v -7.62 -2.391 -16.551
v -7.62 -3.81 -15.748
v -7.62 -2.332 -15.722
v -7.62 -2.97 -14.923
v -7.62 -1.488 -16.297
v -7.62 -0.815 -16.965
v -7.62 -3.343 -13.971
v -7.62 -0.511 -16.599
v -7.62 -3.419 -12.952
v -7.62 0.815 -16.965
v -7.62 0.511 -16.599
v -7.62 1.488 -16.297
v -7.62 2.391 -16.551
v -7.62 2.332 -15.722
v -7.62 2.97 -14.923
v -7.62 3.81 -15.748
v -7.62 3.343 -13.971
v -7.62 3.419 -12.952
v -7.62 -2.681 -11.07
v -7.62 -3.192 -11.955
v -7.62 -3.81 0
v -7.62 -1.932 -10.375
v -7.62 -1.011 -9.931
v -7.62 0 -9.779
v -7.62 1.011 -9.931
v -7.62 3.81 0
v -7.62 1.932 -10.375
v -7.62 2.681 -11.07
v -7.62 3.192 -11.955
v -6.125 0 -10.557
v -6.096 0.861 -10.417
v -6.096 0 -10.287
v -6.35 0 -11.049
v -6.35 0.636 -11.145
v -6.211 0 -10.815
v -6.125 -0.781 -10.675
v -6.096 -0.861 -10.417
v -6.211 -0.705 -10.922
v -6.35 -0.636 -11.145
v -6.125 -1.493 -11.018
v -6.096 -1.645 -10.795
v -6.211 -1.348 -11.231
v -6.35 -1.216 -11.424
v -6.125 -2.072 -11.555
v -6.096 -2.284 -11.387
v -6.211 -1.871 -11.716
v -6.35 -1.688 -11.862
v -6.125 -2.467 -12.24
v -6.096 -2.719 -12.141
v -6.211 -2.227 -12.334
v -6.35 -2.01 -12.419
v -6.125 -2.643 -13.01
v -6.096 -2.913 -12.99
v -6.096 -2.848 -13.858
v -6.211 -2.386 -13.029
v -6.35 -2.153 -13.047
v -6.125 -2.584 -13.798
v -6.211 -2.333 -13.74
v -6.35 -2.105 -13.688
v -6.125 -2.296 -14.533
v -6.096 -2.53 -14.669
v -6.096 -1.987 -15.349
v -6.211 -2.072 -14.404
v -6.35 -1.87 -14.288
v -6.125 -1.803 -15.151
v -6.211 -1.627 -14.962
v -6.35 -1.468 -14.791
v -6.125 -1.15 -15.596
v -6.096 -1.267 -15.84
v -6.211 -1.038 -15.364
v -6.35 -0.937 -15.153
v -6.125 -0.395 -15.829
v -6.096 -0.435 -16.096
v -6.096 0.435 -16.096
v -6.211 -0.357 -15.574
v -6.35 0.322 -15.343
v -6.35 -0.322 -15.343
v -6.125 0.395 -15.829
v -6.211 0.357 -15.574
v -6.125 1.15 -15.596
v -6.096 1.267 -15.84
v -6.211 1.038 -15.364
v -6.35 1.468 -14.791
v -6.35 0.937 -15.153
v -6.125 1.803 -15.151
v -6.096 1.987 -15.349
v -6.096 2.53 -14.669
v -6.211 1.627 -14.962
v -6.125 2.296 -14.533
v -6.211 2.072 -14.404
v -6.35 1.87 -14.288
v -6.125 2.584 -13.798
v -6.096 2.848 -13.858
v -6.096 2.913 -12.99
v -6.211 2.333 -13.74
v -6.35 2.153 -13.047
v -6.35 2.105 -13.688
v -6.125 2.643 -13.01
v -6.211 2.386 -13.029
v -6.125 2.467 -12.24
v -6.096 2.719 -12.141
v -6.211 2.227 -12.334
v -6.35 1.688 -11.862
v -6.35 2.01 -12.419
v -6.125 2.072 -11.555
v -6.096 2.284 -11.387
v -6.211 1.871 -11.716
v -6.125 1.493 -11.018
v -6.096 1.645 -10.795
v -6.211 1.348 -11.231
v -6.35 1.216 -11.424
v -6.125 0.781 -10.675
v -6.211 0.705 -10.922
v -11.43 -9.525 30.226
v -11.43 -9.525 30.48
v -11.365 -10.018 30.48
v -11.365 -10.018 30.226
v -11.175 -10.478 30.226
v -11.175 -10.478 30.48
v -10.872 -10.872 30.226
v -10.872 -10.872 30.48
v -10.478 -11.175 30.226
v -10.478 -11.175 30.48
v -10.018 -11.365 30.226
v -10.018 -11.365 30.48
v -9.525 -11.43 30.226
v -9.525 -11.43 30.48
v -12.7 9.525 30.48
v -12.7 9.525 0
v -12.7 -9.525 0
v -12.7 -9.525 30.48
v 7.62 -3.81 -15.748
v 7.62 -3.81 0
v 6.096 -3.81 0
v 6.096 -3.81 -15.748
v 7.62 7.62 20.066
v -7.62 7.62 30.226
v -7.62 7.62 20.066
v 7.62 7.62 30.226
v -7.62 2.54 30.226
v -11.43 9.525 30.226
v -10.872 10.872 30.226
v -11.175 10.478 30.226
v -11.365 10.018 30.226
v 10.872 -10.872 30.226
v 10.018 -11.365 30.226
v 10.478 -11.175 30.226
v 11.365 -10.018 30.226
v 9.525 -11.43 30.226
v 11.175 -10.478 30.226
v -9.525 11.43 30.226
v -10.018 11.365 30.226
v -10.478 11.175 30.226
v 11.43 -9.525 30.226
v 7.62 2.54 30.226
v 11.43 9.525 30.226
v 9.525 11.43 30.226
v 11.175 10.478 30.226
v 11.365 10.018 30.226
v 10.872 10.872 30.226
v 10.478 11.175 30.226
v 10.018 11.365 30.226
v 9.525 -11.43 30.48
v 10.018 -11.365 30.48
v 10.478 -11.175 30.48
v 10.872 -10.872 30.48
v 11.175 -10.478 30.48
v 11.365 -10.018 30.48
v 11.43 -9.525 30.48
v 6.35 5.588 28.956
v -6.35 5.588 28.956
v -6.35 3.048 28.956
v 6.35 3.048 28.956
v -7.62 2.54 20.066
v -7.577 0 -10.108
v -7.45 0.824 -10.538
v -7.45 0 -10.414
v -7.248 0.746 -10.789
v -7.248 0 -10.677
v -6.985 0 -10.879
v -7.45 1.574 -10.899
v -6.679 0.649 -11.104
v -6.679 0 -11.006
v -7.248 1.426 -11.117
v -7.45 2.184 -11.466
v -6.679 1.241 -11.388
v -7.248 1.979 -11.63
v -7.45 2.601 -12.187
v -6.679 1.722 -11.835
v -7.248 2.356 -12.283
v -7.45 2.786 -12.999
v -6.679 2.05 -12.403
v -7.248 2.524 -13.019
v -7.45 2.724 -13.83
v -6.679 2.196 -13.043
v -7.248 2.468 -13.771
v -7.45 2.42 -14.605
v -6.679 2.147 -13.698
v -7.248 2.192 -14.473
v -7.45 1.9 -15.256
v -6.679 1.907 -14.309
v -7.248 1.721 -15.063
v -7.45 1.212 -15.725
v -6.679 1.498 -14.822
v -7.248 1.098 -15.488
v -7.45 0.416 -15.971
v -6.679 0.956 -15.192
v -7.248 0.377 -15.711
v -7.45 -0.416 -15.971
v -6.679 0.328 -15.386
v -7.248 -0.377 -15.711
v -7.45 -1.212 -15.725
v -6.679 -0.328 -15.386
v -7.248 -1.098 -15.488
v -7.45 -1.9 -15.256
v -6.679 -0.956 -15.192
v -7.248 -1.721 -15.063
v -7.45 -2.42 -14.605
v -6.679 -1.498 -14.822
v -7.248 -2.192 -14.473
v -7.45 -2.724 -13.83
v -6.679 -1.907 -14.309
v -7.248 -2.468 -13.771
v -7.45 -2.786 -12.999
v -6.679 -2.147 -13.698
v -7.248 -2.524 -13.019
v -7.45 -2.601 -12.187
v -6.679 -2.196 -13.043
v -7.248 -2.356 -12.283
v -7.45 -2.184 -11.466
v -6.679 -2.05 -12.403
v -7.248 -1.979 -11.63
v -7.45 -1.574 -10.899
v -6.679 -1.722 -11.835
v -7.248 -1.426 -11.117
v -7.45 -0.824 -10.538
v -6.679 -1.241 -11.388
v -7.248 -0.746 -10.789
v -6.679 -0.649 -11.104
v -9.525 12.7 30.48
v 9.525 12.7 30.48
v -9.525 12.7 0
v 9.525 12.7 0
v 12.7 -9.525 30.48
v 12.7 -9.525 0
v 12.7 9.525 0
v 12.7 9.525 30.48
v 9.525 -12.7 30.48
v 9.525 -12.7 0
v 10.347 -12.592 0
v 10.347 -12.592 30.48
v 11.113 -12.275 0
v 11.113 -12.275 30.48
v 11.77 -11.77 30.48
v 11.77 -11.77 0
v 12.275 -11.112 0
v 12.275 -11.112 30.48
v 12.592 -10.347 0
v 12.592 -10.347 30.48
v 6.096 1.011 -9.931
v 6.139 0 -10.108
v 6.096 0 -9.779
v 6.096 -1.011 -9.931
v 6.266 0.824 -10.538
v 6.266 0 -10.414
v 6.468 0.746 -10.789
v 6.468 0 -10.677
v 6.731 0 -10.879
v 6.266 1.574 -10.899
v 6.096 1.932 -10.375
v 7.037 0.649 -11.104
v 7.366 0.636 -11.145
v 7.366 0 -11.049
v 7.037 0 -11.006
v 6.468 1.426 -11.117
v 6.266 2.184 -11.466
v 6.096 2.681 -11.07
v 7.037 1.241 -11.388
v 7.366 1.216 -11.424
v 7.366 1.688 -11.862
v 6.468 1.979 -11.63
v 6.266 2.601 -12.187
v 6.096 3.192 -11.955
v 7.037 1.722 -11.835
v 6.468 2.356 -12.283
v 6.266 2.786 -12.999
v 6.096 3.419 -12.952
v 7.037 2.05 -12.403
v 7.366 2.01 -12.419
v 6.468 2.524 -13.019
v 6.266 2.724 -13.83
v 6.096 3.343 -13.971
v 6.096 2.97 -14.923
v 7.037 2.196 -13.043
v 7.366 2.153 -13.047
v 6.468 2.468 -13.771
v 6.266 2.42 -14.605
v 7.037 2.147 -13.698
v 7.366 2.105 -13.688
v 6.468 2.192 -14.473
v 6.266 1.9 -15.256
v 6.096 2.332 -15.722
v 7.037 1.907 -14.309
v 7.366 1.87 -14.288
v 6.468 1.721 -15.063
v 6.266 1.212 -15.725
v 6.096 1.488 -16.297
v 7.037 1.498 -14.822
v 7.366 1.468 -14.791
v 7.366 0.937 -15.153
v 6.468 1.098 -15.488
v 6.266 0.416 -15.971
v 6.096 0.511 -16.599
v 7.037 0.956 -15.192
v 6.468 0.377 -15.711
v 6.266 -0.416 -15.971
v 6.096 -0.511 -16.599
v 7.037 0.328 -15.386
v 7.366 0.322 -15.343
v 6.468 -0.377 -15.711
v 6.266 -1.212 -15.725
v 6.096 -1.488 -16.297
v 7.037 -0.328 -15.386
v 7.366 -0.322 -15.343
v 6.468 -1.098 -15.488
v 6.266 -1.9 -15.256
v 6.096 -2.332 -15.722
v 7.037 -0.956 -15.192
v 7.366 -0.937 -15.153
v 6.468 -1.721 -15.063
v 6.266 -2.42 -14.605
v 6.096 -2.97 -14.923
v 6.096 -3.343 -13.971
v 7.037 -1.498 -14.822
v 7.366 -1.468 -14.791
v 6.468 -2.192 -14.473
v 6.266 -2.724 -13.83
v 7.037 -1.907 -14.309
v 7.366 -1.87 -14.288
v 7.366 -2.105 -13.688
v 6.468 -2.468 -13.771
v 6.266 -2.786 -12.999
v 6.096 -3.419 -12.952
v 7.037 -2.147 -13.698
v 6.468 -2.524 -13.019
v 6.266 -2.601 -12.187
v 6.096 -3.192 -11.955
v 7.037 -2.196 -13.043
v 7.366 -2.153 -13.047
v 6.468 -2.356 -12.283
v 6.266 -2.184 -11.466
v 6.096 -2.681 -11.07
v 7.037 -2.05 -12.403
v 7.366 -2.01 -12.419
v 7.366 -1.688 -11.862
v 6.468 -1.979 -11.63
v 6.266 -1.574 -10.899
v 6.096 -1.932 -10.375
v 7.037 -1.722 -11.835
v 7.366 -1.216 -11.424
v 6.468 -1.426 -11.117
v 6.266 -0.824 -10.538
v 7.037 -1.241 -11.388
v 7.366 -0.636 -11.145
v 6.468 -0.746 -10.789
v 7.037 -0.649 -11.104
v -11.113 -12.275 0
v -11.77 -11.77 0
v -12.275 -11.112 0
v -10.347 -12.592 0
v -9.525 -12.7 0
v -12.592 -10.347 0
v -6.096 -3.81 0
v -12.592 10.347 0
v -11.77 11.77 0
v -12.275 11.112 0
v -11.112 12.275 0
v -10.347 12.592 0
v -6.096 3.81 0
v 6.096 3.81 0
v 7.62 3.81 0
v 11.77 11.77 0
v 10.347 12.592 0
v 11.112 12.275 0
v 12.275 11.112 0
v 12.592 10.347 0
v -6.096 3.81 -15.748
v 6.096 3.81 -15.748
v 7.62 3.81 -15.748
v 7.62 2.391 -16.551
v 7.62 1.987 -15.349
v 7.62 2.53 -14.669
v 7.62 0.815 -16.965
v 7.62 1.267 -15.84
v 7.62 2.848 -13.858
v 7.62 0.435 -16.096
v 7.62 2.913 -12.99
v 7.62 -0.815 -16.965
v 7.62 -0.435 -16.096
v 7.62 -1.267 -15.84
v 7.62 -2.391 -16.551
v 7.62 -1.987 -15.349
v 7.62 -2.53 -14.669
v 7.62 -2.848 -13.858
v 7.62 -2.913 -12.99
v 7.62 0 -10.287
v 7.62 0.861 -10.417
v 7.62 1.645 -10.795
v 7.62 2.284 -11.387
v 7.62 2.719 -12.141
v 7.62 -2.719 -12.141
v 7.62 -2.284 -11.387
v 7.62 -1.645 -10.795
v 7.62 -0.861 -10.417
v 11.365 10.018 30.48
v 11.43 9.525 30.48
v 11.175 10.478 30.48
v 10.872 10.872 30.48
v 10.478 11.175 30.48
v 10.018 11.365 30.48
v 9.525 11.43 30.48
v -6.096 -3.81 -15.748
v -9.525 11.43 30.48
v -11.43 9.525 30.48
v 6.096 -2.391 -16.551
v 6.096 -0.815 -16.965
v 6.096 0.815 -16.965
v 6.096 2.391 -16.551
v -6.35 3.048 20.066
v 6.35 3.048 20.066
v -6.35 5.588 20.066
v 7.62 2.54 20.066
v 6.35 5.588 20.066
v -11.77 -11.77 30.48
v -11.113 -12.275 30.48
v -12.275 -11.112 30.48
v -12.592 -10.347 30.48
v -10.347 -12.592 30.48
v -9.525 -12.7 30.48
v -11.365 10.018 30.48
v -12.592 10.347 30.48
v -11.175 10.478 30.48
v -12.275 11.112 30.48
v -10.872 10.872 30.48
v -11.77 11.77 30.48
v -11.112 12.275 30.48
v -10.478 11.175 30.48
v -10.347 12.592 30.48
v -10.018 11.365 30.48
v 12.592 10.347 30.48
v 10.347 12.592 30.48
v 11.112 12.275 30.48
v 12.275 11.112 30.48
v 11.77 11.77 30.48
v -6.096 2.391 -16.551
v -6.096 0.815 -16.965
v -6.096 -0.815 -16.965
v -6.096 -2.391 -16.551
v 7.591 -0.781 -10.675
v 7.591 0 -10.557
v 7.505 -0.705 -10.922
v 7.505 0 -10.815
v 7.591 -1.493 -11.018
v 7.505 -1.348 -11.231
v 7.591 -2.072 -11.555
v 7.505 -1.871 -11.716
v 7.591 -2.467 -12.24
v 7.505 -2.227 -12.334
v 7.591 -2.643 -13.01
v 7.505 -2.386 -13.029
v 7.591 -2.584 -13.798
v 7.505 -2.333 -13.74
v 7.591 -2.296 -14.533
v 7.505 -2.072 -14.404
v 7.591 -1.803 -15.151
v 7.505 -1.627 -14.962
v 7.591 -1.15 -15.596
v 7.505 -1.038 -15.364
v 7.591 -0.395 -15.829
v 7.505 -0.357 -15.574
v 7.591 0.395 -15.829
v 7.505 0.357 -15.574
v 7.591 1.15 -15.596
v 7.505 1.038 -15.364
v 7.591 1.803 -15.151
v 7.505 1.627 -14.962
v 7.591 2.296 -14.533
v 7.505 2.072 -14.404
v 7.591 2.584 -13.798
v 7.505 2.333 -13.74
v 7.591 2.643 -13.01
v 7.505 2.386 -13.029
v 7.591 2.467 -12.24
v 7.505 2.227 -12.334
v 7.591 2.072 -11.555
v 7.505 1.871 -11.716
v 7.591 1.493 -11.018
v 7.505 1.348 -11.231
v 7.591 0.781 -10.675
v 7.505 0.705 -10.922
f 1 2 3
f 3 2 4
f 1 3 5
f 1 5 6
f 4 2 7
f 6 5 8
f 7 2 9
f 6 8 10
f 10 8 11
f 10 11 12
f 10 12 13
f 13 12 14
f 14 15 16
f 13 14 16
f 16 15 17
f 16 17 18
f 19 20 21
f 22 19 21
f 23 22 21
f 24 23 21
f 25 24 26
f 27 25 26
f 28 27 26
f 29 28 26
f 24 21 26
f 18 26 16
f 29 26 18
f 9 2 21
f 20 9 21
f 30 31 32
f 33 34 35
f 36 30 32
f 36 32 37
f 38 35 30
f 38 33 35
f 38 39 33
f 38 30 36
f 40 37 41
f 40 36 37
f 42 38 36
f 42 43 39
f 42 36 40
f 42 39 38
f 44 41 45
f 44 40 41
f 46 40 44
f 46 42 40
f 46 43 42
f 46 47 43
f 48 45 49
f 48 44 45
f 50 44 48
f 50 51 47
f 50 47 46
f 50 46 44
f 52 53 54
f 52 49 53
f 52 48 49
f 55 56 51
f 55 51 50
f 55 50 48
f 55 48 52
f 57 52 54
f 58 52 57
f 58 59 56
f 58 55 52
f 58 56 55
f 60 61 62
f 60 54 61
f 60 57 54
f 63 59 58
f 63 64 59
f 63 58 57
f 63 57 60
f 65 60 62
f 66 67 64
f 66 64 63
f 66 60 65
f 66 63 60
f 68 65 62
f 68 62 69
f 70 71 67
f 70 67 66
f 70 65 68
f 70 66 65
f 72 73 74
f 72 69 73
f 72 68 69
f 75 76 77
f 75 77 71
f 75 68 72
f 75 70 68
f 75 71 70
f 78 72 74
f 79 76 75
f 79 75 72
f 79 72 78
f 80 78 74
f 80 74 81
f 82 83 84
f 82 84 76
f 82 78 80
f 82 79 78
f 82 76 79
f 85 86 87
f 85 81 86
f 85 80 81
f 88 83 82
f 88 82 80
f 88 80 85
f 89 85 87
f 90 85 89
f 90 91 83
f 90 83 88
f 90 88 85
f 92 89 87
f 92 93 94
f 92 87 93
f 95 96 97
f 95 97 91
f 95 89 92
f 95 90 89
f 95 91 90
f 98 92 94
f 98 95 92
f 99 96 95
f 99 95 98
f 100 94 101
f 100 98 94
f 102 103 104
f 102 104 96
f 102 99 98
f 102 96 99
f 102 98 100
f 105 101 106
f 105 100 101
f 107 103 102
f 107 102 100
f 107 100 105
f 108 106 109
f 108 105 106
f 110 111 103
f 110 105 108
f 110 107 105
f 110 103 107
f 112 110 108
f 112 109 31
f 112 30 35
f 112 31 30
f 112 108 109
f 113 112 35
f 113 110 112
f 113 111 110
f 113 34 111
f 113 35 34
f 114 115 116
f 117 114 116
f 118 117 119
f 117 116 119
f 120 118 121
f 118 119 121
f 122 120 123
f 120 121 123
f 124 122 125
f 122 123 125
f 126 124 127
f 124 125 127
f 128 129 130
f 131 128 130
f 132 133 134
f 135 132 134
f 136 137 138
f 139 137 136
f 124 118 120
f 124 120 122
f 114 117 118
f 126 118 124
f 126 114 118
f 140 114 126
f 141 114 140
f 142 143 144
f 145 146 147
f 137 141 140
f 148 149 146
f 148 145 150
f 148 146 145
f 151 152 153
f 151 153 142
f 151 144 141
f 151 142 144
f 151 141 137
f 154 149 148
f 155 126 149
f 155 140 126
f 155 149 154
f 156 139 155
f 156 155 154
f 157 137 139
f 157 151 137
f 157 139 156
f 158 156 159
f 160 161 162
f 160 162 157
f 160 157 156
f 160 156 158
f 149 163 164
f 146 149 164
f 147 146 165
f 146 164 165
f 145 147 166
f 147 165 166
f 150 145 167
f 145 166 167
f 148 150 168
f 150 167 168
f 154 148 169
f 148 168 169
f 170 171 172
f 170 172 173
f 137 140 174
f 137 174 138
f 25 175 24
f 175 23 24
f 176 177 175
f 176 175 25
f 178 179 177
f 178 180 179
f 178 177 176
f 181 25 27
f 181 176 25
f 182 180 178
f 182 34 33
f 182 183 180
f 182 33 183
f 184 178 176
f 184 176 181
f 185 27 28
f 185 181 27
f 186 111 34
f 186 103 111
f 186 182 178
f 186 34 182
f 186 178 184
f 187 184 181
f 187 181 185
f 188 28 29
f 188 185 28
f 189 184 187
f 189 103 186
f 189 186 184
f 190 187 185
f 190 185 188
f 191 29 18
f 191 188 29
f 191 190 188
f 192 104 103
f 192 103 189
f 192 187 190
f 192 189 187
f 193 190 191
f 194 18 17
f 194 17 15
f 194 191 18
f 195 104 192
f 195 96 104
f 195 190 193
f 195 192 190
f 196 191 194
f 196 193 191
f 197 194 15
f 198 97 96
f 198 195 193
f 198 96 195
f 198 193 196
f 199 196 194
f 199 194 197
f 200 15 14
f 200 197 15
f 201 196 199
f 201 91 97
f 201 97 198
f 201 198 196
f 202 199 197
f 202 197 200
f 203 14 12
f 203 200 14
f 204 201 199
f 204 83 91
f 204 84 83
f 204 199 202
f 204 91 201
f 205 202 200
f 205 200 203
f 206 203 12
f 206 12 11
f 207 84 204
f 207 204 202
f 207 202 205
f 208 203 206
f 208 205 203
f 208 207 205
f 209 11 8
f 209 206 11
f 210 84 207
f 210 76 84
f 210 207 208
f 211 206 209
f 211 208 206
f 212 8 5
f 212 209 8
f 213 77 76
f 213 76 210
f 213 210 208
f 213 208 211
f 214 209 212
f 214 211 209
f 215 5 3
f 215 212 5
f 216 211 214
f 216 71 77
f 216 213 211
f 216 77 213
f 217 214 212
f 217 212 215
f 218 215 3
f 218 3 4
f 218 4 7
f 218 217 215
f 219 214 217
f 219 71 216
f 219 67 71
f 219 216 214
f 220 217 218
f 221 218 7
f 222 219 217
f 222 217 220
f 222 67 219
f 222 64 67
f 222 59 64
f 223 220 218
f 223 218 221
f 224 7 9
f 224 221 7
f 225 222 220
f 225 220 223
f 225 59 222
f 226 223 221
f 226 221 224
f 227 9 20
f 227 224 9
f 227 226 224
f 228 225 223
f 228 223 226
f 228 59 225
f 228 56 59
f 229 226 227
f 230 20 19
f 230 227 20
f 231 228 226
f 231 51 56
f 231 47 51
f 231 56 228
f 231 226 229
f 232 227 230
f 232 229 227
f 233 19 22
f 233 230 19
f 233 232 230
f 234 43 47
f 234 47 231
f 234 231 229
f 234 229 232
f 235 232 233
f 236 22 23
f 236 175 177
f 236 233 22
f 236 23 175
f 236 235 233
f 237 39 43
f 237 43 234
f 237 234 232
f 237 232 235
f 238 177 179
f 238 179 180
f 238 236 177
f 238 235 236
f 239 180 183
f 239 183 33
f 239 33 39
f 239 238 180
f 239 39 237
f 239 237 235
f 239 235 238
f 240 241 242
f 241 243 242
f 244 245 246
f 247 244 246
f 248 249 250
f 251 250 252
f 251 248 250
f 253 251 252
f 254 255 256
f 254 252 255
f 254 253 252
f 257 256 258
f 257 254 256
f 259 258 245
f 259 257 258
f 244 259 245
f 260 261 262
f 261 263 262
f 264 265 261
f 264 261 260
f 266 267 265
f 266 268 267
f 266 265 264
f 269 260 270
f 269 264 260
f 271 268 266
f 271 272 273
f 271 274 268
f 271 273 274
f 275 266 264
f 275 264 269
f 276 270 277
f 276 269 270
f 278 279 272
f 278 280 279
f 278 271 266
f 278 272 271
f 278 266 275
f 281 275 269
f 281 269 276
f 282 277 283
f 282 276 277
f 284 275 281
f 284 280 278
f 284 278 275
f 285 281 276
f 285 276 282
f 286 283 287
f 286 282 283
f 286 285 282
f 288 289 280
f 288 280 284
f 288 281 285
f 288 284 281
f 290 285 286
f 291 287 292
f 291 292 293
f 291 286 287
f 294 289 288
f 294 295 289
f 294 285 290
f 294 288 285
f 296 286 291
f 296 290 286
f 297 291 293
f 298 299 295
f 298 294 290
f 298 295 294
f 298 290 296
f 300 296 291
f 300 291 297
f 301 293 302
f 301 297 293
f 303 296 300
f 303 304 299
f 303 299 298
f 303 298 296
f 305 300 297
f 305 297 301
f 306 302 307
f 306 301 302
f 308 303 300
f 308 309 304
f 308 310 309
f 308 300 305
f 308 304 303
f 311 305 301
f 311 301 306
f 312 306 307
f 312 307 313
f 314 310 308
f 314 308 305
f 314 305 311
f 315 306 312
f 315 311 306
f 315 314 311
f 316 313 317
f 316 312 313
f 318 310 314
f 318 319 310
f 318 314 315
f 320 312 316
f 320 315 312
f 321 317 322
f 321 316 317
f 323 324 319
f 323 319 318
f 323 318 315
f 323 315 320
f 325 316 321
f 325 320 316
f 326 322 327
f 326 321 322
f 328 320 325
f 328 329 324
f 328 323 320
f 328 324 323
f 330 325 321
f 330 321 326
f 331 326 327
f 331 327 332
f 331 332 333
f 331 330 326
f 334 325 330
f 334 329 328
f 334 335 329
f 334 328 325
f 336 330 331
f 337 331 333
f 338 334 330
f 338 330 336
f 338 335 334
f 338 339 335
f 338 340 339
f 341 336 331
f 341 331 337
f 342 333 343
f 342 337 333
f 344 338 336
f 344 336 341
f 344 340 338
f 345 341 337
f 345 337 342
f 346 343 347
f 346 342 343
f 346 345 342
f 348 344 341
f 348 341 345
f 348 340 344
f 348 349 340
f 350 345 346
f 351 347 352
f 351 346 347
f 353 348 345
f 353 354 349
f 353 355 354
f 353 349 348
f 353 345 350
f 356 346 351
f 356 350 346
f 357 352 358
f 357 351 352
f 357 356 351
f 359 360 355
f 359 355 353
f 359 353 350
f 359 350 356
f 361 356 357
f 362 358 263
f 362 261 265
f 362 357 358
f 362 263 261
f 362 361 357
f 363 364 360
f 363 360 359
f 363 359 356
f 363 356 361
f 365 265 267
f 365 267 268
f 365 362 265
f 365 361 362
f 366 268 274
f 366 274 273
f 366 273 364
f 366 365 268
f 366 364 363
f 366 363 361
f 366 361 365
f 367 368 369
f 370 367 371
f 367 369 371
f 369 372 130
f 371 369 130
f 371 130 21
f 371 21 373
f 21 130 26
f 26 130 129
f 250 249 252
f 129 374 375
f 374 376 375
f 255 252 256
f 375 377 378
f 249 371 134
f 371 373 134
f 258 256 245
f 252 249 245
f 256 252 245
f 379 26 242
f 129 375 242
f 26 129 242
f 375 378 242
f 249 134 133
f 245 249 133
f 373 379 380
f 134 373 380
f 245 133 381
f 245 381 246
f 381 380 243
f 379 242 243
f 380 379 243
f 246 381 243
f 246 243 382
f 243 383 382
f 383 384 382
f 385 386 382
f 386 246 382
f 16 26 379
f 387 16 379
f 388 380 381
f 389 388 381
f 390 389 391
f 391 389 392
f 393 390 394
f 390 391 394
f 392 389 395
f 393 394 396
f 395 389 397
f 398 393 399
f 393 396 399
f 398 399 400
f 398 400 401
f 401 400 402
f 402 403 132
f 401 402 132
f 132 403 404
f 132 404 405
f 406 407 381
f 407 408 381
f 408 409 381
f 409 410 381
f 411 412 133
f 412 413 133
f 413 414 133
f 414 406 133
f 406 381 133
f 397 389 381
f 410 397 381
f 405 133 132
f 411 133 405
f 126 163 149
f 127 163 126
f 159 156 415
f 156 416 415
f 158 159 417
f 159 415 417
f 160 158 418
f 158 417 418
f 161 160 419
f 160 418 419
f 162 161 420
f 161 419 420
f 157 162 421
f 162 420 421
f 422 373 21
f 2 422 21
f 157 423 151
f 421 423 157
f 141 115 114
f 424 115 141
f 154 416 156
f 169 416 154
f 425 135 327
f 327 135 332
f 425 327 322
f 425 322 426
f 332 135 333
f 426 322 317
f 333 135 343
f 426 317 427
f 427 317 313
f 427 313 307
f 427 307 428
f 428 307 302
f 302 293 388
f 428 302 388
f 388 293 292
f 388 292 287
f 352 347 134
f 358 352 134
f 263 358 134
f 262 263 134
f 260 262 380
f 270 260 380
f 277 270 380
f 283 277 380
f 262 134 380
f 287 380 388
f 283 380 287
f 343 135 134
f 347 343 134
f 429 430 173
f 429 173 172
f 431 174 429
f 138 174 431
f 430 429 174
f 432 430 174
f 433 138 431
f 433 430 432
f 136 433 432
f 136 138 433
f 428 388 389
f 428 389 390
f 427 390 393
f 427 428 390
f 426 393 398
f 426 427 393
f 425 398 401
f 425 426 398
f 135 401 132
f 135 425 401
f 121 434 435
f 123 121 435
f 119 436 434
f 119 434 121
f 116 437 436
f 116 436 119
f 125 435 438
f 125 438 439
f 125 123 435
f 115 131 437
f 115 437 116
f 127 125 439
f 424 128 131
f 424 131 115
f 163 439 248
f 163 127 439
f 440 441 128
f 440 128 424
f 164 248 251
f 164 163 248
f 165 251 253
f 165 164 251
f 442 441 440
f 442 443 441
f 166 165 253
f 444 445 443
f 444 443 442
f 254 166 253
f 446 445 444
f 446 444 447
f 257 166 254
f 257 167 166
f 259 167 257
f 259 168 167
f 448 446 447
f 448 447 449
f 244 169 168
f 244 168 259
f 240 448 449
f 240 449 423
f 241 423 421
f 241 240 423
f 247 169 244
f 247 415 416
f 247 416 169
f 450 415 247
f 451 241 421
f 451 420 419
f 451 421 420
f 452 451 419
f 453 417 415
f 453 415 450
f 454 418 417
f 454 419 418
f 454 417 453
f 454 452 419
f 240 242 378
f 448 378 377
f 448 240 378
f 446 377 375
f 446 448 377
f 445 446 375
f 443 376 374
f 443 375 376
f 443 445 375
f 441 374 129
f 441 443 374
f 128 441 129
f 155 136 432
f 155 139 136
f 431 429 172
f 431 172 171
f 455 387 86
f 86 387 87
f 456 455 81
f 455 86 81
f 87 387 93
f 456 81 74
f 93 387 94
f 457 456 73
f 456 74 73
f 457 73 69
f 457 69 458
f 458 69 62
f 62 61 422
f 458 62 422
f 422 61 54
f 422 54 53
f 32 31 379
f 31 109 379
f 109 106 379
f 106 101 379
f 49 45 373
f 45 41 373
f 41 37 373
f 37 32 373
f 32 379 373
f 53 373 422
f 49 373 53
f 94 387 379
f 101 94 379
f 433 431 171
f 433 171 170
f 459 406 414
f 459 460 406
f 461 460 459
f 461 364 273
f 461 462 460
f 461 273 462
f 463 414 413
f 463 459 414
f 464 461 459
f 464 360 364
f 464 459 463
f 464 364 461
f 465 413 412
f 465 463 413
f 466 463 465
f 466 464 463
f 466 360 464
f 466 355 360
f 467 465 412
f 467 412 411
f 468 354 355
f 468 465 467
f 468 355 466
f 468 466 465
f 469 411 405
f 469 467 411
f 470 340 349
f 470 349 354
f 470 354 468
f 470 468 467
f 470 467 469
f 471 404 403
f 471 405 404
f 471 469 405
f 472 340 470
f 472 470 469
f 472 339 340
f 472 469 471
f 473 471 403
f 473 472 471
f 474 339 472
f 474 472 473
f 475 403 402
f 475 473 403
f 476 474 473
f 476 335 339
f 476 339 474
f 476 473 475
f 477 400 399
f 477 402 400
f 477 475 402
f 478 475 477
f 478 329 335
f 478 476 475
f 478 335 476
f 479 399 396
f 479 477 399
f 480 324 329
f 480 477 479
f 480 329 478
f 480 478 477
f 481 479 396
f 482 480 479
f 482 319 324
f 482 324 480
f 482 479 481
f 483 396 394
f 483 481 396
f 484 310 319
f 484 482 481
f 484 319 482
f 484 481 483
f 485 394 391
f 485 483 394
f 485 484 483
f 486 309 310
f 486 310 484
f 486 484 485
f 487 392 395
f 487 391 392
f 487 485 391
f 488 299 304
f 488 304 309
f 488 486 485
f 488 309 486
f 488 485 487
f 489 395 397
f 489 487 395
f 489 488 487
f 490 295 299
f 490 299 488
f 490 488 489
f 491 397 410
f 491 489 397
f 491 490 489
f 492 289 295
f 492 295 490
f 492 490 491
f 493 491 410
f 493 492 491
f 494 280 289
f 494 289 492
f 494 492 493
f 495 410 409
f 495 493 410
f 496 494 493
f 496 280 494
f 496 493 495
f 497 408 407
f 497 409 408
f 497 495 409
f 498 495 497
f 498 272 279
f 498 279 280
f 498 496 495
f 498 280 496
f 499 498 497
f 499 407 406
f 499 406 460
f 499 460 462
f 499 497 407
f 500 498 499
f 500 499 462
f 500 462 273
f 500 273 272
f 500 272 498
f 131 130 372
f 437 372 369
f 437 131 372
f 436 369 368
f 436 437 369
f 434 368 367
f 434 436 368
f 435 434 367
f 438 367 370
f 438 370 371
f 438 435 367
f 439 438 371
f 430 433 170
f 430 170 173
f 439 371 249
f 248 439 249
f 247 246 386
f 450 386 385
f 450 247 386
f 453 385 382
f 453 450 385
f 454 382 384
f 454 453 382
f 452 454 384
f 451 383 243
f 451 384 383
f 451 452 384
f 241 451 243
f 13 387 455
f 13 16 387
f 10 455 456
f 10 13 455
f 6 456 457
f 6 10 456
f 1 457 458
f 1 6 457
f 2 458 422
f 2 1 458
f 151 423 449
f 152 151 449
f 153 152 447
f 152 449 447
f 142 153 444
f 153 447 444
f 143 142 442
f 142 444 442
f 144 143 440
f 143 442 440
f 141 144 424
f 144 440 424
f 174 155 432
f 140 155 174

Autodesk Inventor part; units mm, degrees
ref_plane "YZ Plane" through (0, 0, 0) normal (1, 0, 0) x (0, 1, 0)
ref_plane "XZ Plane" through (0, 0, 0) normal (0, 1, 0) x (-1, 0, 0)
ref_plane "XY Plane" through (0, 0, 0) normal (0, 0, 1) x (1, 0, 0)
sketch "Sketch1" plane through (0, 0, 0) normal (0, 0, 1) x (1, 0, 0)
  line L0 (-12.7, -12.7) -> (12.7, -12.7)
  line L1 (12.7, -12.7) -> (12.7, 12.7)
  line L2 (12.7, 12.7) -> (-12.7, 12.7)
  line L3 (-12.7, 12.7) -> (-12.7, -12.7)
  line L4 (-12.7, -12.7) -> (12.7, 12.7) construction
  line L5 (12.7, -12.7) -> (-12.7, 12.7) construction
  point P0 (0, 0)
  dimension "d0" = 25.4
extrude "Extrusion1" add sketch "Sketch1" along normal blind 30.48
fillet "Fillet1" radius 3.175 4 edges at (-12.7, 12.7, 15.24) (-12.7, -12.7, 15.24) (12.7, -12.7, 15.24) (12.7, 12.7, 15.24)
sketch "Sketch2" plane through (0, 0, 30.48) normal (0, 0, 1) x (1, 0, 0)
  arc A0 (12.7, 9.525) -> (9.525, 12.7) centre (9.525, 9.525) ccw projected
  line L0 (9.525, 12.7) -> (-9.525, 12.7) projected
  arc A1 (-9.525, 12.7) -> (-12.7, 9.525) centre (-9.525, 9.525) ccw projected
  line L1 (-12.7, 9.525) -> (-12.7, -9.525) projected
  arc A2 (-12.7, -9.525) -> (-9.525, -12.7) centre (-9.525, -9.525) ccw projected
  line L2 (-9.525, -12.7) -> (9.525, -12.7) projected
  arc A3 (9.525, -12.7) -> (12.7, -9.525) centre (9.525, -9.525) ccw projected
  line L3 (12.7, -9.525) -> (12.7, 9.525) projected
  line L4 (-9.525, 11.43) -> (9.525, 11.43)
  arc A4 (11.43, 9.525) -> (9.525, 11.43) centre (9.525, 9.525) ccw
  line L5 (11.43, 9.525) -> (11.43, -9.525)
  arc A5 (9.525, -11.43) -> (11.43, -9.525) centre (9.525, -9.525) ccw
  line L6 (9.525, -11.43) -> (-9.525, -11.43)
  arc A6 (-11.43, -9.525) -> (-9.525, -11.43) centre (-9.525, -9.525) ccw
  line L7 (-11.43, -9.525) -> (-11.43, 9.525)
  arc A7 (-9.525, 11.43) -> (-11.43, 9.525) centre (-9.525, 9.525) ccw
  point P0 (0, 0)
  dimension "d4" = 1.27
extrude "Extrusion2" cut sketch "Sketch2" against normal blind 0.254 contours L4 A4 L5 A5 L6 A6 L7 A7
sketch "Sketch3" plane through (0, 0, 30.226) normal (0, 0, 1) x (1, 0, 0)
  line L0 (-7.62, 7.62) -> (7.62, 7.62)
  line L1 (7.62, 7.62) -> (7.62, 2.54)
  line L2 (7.62, 2.54) -> (-7.62, 2.54)
  line L3 (-7.62, 2.54) -> (-7.62, 7.62)
  line L4 (-7.62, 7.62) -> (7.62, 2.54) construction
  line L5 (7.62, 7.62) -> (-7.62, 2.54) construction
  line L6 (11.43, 9.525) -> (11.43, -9.525) projected
  line L7 (-11.43, -9.525) -> (-11.43, 9.525) projected
  line L8 (-9.525, 11.43) -> (9.525, 11.43) projected
  point P0 (0, 0)
  point P1 (0, 5.08)
  dimension "d7" = 3.81
  dimension "d8" = 3.81
  dimension "d9" = 3.81
  dimension "d10" = 5.08
extrude "Extrusion3" cut sketch "Sketch3" against normal blind 10.16
sketch "Sketch4" plane through (0, 0, 20.066) normal (0, 0, 1) x (1, 0, 0)
  line L0 (-6.35, 5.588) -> (6.35, 5.588)
  line L1 (6.35, 5.588) -> (6.35, 3.048)
  line L2 (6.35, 3.048) -> (-6.35, 3.048)
  line L3 (-6.35, 3.048) -> (-6.35, 5.588)
  line L4 (-6.35, 5.588) -> (6.35, 3.048) construction
  line L5 (6.35, 5.588) -> (-6.35, 3.048) construction
  line L6 (-7.62, 2.54) -> (-7.62, 7.62) projected
  line L7 (7.62, 7.62) -> (7.62, 2.54) projected
  line L8 (7.62, 2.54) -> (-7.62, 2.54) projected
  point P0 (0, 0)
  point P1 (0, 4.318)
  point P2 (7.62, 5.08)
  dimension "d13" = 1.27
  dimension "d14" = 1.27
  dimension "d15" = 0.508
  dimension "d16" = 2.54
extrude "Extrusion4" add sketch "Sketch4" along normal blind 8.89
sketch "Sketch5" plane through (0, 0, 0) normal (0, 0, -1) x (-1, 0, 0)
  line L0 (0, 0) -> (6.858, 0) construction
  line L1 (0, 0) -> (-6.858, 0) construction
  line L2 (6.096, -3.81) -> (7.62, -3.81)
  line L3 (7.62, -3.81) -> (7.62, 3.81)
  line L4 (7.62, 3.81) -> (6.096, 3.81)
  line L5 (6.096, 3.81) -> (6.096, -3.81)
  line L6 (6.096, -3.81) -> (7.62, 3.81) construction
  line L7 (7.62, -3.81) -> (6.096, 3.81) construction
  line L8 (-7.62, -3.81) -> (-6.096, -3.81)
  line L9 (-6.096, -3.81) -> (-6.096, 3.81)
  line L10 (-6.096, 3.81) -> (-7.62, 3.81)
  line L11 (-7.62, 3.81) -> (-7.62, -3.81)
  line L12 (-7.62, -3.81) -> (-6.096, 3.81) construction
  line L13 (-6.096, -3.81) -> (-7.62, 3.81) construction
  dimension "d19" = 6.858
  dimension "d20" = 7.62
  dimension "d21" = 1.524
extrude "Extrusion5" add sketch "Sketch5" along normal blind 17.78
sketch "Sketch6" plane through (-7.62, -3.81, 0) normal (-1, 0, 0) x (0, 0, 1)
  line L0 (0, 7.62) -> (-17.78, 7.62) projected
  line L1 (0, 0) -> (-17.78, 0) projected
  arc A0 (-15.748, 7.62) -> (-15.748, 0) centre (-10.668, 3.81) ccw
  line L2 (-15.748, 7.62) -> (-17.78, 7.62)
  line L3 (-17.78, 0) -> (-17.78, 7.62) projected
  line L4 (-17.78, 0) -> (-15.748, 0)
  point P0 (0, 3.81)
  dimension "d24" = 2.032
  dimension "d25" = 2.032
  dimension "d26" = 6.35
extrude "Extrusion6" cut sketch "Sketch6" against normal blind 17.78
sketch "Sketch7" plane through (-7.62, -3.81, 0) normal (-1, 0, 0) x (0, 0, 1)
  arc A0 (-15.748, 7.62) -> (-15.748, 0) centre (-10.668, 3.81) ccw construction
  line L0 (-17.018, 3.81) -> (-13.208, 3.81) construction
  circle A1 centre (-13.208, 3.81) radius 2.159
  point P0 (0, 3.81)
  dimension "d29" = 3.81
  dimension "d30" = 4.318
extrude "Extrusion7" cut sketch "Sketch7" against normal blind 17.78
fillet "Fillet2" radius 1.27 4 edges at (-7.62, 0, -15.367) (6.096, 0, -15.367) (-6.096, 0, -15.367) (7.62, 0, -15.367)
properties part number "iPhone Charger"
